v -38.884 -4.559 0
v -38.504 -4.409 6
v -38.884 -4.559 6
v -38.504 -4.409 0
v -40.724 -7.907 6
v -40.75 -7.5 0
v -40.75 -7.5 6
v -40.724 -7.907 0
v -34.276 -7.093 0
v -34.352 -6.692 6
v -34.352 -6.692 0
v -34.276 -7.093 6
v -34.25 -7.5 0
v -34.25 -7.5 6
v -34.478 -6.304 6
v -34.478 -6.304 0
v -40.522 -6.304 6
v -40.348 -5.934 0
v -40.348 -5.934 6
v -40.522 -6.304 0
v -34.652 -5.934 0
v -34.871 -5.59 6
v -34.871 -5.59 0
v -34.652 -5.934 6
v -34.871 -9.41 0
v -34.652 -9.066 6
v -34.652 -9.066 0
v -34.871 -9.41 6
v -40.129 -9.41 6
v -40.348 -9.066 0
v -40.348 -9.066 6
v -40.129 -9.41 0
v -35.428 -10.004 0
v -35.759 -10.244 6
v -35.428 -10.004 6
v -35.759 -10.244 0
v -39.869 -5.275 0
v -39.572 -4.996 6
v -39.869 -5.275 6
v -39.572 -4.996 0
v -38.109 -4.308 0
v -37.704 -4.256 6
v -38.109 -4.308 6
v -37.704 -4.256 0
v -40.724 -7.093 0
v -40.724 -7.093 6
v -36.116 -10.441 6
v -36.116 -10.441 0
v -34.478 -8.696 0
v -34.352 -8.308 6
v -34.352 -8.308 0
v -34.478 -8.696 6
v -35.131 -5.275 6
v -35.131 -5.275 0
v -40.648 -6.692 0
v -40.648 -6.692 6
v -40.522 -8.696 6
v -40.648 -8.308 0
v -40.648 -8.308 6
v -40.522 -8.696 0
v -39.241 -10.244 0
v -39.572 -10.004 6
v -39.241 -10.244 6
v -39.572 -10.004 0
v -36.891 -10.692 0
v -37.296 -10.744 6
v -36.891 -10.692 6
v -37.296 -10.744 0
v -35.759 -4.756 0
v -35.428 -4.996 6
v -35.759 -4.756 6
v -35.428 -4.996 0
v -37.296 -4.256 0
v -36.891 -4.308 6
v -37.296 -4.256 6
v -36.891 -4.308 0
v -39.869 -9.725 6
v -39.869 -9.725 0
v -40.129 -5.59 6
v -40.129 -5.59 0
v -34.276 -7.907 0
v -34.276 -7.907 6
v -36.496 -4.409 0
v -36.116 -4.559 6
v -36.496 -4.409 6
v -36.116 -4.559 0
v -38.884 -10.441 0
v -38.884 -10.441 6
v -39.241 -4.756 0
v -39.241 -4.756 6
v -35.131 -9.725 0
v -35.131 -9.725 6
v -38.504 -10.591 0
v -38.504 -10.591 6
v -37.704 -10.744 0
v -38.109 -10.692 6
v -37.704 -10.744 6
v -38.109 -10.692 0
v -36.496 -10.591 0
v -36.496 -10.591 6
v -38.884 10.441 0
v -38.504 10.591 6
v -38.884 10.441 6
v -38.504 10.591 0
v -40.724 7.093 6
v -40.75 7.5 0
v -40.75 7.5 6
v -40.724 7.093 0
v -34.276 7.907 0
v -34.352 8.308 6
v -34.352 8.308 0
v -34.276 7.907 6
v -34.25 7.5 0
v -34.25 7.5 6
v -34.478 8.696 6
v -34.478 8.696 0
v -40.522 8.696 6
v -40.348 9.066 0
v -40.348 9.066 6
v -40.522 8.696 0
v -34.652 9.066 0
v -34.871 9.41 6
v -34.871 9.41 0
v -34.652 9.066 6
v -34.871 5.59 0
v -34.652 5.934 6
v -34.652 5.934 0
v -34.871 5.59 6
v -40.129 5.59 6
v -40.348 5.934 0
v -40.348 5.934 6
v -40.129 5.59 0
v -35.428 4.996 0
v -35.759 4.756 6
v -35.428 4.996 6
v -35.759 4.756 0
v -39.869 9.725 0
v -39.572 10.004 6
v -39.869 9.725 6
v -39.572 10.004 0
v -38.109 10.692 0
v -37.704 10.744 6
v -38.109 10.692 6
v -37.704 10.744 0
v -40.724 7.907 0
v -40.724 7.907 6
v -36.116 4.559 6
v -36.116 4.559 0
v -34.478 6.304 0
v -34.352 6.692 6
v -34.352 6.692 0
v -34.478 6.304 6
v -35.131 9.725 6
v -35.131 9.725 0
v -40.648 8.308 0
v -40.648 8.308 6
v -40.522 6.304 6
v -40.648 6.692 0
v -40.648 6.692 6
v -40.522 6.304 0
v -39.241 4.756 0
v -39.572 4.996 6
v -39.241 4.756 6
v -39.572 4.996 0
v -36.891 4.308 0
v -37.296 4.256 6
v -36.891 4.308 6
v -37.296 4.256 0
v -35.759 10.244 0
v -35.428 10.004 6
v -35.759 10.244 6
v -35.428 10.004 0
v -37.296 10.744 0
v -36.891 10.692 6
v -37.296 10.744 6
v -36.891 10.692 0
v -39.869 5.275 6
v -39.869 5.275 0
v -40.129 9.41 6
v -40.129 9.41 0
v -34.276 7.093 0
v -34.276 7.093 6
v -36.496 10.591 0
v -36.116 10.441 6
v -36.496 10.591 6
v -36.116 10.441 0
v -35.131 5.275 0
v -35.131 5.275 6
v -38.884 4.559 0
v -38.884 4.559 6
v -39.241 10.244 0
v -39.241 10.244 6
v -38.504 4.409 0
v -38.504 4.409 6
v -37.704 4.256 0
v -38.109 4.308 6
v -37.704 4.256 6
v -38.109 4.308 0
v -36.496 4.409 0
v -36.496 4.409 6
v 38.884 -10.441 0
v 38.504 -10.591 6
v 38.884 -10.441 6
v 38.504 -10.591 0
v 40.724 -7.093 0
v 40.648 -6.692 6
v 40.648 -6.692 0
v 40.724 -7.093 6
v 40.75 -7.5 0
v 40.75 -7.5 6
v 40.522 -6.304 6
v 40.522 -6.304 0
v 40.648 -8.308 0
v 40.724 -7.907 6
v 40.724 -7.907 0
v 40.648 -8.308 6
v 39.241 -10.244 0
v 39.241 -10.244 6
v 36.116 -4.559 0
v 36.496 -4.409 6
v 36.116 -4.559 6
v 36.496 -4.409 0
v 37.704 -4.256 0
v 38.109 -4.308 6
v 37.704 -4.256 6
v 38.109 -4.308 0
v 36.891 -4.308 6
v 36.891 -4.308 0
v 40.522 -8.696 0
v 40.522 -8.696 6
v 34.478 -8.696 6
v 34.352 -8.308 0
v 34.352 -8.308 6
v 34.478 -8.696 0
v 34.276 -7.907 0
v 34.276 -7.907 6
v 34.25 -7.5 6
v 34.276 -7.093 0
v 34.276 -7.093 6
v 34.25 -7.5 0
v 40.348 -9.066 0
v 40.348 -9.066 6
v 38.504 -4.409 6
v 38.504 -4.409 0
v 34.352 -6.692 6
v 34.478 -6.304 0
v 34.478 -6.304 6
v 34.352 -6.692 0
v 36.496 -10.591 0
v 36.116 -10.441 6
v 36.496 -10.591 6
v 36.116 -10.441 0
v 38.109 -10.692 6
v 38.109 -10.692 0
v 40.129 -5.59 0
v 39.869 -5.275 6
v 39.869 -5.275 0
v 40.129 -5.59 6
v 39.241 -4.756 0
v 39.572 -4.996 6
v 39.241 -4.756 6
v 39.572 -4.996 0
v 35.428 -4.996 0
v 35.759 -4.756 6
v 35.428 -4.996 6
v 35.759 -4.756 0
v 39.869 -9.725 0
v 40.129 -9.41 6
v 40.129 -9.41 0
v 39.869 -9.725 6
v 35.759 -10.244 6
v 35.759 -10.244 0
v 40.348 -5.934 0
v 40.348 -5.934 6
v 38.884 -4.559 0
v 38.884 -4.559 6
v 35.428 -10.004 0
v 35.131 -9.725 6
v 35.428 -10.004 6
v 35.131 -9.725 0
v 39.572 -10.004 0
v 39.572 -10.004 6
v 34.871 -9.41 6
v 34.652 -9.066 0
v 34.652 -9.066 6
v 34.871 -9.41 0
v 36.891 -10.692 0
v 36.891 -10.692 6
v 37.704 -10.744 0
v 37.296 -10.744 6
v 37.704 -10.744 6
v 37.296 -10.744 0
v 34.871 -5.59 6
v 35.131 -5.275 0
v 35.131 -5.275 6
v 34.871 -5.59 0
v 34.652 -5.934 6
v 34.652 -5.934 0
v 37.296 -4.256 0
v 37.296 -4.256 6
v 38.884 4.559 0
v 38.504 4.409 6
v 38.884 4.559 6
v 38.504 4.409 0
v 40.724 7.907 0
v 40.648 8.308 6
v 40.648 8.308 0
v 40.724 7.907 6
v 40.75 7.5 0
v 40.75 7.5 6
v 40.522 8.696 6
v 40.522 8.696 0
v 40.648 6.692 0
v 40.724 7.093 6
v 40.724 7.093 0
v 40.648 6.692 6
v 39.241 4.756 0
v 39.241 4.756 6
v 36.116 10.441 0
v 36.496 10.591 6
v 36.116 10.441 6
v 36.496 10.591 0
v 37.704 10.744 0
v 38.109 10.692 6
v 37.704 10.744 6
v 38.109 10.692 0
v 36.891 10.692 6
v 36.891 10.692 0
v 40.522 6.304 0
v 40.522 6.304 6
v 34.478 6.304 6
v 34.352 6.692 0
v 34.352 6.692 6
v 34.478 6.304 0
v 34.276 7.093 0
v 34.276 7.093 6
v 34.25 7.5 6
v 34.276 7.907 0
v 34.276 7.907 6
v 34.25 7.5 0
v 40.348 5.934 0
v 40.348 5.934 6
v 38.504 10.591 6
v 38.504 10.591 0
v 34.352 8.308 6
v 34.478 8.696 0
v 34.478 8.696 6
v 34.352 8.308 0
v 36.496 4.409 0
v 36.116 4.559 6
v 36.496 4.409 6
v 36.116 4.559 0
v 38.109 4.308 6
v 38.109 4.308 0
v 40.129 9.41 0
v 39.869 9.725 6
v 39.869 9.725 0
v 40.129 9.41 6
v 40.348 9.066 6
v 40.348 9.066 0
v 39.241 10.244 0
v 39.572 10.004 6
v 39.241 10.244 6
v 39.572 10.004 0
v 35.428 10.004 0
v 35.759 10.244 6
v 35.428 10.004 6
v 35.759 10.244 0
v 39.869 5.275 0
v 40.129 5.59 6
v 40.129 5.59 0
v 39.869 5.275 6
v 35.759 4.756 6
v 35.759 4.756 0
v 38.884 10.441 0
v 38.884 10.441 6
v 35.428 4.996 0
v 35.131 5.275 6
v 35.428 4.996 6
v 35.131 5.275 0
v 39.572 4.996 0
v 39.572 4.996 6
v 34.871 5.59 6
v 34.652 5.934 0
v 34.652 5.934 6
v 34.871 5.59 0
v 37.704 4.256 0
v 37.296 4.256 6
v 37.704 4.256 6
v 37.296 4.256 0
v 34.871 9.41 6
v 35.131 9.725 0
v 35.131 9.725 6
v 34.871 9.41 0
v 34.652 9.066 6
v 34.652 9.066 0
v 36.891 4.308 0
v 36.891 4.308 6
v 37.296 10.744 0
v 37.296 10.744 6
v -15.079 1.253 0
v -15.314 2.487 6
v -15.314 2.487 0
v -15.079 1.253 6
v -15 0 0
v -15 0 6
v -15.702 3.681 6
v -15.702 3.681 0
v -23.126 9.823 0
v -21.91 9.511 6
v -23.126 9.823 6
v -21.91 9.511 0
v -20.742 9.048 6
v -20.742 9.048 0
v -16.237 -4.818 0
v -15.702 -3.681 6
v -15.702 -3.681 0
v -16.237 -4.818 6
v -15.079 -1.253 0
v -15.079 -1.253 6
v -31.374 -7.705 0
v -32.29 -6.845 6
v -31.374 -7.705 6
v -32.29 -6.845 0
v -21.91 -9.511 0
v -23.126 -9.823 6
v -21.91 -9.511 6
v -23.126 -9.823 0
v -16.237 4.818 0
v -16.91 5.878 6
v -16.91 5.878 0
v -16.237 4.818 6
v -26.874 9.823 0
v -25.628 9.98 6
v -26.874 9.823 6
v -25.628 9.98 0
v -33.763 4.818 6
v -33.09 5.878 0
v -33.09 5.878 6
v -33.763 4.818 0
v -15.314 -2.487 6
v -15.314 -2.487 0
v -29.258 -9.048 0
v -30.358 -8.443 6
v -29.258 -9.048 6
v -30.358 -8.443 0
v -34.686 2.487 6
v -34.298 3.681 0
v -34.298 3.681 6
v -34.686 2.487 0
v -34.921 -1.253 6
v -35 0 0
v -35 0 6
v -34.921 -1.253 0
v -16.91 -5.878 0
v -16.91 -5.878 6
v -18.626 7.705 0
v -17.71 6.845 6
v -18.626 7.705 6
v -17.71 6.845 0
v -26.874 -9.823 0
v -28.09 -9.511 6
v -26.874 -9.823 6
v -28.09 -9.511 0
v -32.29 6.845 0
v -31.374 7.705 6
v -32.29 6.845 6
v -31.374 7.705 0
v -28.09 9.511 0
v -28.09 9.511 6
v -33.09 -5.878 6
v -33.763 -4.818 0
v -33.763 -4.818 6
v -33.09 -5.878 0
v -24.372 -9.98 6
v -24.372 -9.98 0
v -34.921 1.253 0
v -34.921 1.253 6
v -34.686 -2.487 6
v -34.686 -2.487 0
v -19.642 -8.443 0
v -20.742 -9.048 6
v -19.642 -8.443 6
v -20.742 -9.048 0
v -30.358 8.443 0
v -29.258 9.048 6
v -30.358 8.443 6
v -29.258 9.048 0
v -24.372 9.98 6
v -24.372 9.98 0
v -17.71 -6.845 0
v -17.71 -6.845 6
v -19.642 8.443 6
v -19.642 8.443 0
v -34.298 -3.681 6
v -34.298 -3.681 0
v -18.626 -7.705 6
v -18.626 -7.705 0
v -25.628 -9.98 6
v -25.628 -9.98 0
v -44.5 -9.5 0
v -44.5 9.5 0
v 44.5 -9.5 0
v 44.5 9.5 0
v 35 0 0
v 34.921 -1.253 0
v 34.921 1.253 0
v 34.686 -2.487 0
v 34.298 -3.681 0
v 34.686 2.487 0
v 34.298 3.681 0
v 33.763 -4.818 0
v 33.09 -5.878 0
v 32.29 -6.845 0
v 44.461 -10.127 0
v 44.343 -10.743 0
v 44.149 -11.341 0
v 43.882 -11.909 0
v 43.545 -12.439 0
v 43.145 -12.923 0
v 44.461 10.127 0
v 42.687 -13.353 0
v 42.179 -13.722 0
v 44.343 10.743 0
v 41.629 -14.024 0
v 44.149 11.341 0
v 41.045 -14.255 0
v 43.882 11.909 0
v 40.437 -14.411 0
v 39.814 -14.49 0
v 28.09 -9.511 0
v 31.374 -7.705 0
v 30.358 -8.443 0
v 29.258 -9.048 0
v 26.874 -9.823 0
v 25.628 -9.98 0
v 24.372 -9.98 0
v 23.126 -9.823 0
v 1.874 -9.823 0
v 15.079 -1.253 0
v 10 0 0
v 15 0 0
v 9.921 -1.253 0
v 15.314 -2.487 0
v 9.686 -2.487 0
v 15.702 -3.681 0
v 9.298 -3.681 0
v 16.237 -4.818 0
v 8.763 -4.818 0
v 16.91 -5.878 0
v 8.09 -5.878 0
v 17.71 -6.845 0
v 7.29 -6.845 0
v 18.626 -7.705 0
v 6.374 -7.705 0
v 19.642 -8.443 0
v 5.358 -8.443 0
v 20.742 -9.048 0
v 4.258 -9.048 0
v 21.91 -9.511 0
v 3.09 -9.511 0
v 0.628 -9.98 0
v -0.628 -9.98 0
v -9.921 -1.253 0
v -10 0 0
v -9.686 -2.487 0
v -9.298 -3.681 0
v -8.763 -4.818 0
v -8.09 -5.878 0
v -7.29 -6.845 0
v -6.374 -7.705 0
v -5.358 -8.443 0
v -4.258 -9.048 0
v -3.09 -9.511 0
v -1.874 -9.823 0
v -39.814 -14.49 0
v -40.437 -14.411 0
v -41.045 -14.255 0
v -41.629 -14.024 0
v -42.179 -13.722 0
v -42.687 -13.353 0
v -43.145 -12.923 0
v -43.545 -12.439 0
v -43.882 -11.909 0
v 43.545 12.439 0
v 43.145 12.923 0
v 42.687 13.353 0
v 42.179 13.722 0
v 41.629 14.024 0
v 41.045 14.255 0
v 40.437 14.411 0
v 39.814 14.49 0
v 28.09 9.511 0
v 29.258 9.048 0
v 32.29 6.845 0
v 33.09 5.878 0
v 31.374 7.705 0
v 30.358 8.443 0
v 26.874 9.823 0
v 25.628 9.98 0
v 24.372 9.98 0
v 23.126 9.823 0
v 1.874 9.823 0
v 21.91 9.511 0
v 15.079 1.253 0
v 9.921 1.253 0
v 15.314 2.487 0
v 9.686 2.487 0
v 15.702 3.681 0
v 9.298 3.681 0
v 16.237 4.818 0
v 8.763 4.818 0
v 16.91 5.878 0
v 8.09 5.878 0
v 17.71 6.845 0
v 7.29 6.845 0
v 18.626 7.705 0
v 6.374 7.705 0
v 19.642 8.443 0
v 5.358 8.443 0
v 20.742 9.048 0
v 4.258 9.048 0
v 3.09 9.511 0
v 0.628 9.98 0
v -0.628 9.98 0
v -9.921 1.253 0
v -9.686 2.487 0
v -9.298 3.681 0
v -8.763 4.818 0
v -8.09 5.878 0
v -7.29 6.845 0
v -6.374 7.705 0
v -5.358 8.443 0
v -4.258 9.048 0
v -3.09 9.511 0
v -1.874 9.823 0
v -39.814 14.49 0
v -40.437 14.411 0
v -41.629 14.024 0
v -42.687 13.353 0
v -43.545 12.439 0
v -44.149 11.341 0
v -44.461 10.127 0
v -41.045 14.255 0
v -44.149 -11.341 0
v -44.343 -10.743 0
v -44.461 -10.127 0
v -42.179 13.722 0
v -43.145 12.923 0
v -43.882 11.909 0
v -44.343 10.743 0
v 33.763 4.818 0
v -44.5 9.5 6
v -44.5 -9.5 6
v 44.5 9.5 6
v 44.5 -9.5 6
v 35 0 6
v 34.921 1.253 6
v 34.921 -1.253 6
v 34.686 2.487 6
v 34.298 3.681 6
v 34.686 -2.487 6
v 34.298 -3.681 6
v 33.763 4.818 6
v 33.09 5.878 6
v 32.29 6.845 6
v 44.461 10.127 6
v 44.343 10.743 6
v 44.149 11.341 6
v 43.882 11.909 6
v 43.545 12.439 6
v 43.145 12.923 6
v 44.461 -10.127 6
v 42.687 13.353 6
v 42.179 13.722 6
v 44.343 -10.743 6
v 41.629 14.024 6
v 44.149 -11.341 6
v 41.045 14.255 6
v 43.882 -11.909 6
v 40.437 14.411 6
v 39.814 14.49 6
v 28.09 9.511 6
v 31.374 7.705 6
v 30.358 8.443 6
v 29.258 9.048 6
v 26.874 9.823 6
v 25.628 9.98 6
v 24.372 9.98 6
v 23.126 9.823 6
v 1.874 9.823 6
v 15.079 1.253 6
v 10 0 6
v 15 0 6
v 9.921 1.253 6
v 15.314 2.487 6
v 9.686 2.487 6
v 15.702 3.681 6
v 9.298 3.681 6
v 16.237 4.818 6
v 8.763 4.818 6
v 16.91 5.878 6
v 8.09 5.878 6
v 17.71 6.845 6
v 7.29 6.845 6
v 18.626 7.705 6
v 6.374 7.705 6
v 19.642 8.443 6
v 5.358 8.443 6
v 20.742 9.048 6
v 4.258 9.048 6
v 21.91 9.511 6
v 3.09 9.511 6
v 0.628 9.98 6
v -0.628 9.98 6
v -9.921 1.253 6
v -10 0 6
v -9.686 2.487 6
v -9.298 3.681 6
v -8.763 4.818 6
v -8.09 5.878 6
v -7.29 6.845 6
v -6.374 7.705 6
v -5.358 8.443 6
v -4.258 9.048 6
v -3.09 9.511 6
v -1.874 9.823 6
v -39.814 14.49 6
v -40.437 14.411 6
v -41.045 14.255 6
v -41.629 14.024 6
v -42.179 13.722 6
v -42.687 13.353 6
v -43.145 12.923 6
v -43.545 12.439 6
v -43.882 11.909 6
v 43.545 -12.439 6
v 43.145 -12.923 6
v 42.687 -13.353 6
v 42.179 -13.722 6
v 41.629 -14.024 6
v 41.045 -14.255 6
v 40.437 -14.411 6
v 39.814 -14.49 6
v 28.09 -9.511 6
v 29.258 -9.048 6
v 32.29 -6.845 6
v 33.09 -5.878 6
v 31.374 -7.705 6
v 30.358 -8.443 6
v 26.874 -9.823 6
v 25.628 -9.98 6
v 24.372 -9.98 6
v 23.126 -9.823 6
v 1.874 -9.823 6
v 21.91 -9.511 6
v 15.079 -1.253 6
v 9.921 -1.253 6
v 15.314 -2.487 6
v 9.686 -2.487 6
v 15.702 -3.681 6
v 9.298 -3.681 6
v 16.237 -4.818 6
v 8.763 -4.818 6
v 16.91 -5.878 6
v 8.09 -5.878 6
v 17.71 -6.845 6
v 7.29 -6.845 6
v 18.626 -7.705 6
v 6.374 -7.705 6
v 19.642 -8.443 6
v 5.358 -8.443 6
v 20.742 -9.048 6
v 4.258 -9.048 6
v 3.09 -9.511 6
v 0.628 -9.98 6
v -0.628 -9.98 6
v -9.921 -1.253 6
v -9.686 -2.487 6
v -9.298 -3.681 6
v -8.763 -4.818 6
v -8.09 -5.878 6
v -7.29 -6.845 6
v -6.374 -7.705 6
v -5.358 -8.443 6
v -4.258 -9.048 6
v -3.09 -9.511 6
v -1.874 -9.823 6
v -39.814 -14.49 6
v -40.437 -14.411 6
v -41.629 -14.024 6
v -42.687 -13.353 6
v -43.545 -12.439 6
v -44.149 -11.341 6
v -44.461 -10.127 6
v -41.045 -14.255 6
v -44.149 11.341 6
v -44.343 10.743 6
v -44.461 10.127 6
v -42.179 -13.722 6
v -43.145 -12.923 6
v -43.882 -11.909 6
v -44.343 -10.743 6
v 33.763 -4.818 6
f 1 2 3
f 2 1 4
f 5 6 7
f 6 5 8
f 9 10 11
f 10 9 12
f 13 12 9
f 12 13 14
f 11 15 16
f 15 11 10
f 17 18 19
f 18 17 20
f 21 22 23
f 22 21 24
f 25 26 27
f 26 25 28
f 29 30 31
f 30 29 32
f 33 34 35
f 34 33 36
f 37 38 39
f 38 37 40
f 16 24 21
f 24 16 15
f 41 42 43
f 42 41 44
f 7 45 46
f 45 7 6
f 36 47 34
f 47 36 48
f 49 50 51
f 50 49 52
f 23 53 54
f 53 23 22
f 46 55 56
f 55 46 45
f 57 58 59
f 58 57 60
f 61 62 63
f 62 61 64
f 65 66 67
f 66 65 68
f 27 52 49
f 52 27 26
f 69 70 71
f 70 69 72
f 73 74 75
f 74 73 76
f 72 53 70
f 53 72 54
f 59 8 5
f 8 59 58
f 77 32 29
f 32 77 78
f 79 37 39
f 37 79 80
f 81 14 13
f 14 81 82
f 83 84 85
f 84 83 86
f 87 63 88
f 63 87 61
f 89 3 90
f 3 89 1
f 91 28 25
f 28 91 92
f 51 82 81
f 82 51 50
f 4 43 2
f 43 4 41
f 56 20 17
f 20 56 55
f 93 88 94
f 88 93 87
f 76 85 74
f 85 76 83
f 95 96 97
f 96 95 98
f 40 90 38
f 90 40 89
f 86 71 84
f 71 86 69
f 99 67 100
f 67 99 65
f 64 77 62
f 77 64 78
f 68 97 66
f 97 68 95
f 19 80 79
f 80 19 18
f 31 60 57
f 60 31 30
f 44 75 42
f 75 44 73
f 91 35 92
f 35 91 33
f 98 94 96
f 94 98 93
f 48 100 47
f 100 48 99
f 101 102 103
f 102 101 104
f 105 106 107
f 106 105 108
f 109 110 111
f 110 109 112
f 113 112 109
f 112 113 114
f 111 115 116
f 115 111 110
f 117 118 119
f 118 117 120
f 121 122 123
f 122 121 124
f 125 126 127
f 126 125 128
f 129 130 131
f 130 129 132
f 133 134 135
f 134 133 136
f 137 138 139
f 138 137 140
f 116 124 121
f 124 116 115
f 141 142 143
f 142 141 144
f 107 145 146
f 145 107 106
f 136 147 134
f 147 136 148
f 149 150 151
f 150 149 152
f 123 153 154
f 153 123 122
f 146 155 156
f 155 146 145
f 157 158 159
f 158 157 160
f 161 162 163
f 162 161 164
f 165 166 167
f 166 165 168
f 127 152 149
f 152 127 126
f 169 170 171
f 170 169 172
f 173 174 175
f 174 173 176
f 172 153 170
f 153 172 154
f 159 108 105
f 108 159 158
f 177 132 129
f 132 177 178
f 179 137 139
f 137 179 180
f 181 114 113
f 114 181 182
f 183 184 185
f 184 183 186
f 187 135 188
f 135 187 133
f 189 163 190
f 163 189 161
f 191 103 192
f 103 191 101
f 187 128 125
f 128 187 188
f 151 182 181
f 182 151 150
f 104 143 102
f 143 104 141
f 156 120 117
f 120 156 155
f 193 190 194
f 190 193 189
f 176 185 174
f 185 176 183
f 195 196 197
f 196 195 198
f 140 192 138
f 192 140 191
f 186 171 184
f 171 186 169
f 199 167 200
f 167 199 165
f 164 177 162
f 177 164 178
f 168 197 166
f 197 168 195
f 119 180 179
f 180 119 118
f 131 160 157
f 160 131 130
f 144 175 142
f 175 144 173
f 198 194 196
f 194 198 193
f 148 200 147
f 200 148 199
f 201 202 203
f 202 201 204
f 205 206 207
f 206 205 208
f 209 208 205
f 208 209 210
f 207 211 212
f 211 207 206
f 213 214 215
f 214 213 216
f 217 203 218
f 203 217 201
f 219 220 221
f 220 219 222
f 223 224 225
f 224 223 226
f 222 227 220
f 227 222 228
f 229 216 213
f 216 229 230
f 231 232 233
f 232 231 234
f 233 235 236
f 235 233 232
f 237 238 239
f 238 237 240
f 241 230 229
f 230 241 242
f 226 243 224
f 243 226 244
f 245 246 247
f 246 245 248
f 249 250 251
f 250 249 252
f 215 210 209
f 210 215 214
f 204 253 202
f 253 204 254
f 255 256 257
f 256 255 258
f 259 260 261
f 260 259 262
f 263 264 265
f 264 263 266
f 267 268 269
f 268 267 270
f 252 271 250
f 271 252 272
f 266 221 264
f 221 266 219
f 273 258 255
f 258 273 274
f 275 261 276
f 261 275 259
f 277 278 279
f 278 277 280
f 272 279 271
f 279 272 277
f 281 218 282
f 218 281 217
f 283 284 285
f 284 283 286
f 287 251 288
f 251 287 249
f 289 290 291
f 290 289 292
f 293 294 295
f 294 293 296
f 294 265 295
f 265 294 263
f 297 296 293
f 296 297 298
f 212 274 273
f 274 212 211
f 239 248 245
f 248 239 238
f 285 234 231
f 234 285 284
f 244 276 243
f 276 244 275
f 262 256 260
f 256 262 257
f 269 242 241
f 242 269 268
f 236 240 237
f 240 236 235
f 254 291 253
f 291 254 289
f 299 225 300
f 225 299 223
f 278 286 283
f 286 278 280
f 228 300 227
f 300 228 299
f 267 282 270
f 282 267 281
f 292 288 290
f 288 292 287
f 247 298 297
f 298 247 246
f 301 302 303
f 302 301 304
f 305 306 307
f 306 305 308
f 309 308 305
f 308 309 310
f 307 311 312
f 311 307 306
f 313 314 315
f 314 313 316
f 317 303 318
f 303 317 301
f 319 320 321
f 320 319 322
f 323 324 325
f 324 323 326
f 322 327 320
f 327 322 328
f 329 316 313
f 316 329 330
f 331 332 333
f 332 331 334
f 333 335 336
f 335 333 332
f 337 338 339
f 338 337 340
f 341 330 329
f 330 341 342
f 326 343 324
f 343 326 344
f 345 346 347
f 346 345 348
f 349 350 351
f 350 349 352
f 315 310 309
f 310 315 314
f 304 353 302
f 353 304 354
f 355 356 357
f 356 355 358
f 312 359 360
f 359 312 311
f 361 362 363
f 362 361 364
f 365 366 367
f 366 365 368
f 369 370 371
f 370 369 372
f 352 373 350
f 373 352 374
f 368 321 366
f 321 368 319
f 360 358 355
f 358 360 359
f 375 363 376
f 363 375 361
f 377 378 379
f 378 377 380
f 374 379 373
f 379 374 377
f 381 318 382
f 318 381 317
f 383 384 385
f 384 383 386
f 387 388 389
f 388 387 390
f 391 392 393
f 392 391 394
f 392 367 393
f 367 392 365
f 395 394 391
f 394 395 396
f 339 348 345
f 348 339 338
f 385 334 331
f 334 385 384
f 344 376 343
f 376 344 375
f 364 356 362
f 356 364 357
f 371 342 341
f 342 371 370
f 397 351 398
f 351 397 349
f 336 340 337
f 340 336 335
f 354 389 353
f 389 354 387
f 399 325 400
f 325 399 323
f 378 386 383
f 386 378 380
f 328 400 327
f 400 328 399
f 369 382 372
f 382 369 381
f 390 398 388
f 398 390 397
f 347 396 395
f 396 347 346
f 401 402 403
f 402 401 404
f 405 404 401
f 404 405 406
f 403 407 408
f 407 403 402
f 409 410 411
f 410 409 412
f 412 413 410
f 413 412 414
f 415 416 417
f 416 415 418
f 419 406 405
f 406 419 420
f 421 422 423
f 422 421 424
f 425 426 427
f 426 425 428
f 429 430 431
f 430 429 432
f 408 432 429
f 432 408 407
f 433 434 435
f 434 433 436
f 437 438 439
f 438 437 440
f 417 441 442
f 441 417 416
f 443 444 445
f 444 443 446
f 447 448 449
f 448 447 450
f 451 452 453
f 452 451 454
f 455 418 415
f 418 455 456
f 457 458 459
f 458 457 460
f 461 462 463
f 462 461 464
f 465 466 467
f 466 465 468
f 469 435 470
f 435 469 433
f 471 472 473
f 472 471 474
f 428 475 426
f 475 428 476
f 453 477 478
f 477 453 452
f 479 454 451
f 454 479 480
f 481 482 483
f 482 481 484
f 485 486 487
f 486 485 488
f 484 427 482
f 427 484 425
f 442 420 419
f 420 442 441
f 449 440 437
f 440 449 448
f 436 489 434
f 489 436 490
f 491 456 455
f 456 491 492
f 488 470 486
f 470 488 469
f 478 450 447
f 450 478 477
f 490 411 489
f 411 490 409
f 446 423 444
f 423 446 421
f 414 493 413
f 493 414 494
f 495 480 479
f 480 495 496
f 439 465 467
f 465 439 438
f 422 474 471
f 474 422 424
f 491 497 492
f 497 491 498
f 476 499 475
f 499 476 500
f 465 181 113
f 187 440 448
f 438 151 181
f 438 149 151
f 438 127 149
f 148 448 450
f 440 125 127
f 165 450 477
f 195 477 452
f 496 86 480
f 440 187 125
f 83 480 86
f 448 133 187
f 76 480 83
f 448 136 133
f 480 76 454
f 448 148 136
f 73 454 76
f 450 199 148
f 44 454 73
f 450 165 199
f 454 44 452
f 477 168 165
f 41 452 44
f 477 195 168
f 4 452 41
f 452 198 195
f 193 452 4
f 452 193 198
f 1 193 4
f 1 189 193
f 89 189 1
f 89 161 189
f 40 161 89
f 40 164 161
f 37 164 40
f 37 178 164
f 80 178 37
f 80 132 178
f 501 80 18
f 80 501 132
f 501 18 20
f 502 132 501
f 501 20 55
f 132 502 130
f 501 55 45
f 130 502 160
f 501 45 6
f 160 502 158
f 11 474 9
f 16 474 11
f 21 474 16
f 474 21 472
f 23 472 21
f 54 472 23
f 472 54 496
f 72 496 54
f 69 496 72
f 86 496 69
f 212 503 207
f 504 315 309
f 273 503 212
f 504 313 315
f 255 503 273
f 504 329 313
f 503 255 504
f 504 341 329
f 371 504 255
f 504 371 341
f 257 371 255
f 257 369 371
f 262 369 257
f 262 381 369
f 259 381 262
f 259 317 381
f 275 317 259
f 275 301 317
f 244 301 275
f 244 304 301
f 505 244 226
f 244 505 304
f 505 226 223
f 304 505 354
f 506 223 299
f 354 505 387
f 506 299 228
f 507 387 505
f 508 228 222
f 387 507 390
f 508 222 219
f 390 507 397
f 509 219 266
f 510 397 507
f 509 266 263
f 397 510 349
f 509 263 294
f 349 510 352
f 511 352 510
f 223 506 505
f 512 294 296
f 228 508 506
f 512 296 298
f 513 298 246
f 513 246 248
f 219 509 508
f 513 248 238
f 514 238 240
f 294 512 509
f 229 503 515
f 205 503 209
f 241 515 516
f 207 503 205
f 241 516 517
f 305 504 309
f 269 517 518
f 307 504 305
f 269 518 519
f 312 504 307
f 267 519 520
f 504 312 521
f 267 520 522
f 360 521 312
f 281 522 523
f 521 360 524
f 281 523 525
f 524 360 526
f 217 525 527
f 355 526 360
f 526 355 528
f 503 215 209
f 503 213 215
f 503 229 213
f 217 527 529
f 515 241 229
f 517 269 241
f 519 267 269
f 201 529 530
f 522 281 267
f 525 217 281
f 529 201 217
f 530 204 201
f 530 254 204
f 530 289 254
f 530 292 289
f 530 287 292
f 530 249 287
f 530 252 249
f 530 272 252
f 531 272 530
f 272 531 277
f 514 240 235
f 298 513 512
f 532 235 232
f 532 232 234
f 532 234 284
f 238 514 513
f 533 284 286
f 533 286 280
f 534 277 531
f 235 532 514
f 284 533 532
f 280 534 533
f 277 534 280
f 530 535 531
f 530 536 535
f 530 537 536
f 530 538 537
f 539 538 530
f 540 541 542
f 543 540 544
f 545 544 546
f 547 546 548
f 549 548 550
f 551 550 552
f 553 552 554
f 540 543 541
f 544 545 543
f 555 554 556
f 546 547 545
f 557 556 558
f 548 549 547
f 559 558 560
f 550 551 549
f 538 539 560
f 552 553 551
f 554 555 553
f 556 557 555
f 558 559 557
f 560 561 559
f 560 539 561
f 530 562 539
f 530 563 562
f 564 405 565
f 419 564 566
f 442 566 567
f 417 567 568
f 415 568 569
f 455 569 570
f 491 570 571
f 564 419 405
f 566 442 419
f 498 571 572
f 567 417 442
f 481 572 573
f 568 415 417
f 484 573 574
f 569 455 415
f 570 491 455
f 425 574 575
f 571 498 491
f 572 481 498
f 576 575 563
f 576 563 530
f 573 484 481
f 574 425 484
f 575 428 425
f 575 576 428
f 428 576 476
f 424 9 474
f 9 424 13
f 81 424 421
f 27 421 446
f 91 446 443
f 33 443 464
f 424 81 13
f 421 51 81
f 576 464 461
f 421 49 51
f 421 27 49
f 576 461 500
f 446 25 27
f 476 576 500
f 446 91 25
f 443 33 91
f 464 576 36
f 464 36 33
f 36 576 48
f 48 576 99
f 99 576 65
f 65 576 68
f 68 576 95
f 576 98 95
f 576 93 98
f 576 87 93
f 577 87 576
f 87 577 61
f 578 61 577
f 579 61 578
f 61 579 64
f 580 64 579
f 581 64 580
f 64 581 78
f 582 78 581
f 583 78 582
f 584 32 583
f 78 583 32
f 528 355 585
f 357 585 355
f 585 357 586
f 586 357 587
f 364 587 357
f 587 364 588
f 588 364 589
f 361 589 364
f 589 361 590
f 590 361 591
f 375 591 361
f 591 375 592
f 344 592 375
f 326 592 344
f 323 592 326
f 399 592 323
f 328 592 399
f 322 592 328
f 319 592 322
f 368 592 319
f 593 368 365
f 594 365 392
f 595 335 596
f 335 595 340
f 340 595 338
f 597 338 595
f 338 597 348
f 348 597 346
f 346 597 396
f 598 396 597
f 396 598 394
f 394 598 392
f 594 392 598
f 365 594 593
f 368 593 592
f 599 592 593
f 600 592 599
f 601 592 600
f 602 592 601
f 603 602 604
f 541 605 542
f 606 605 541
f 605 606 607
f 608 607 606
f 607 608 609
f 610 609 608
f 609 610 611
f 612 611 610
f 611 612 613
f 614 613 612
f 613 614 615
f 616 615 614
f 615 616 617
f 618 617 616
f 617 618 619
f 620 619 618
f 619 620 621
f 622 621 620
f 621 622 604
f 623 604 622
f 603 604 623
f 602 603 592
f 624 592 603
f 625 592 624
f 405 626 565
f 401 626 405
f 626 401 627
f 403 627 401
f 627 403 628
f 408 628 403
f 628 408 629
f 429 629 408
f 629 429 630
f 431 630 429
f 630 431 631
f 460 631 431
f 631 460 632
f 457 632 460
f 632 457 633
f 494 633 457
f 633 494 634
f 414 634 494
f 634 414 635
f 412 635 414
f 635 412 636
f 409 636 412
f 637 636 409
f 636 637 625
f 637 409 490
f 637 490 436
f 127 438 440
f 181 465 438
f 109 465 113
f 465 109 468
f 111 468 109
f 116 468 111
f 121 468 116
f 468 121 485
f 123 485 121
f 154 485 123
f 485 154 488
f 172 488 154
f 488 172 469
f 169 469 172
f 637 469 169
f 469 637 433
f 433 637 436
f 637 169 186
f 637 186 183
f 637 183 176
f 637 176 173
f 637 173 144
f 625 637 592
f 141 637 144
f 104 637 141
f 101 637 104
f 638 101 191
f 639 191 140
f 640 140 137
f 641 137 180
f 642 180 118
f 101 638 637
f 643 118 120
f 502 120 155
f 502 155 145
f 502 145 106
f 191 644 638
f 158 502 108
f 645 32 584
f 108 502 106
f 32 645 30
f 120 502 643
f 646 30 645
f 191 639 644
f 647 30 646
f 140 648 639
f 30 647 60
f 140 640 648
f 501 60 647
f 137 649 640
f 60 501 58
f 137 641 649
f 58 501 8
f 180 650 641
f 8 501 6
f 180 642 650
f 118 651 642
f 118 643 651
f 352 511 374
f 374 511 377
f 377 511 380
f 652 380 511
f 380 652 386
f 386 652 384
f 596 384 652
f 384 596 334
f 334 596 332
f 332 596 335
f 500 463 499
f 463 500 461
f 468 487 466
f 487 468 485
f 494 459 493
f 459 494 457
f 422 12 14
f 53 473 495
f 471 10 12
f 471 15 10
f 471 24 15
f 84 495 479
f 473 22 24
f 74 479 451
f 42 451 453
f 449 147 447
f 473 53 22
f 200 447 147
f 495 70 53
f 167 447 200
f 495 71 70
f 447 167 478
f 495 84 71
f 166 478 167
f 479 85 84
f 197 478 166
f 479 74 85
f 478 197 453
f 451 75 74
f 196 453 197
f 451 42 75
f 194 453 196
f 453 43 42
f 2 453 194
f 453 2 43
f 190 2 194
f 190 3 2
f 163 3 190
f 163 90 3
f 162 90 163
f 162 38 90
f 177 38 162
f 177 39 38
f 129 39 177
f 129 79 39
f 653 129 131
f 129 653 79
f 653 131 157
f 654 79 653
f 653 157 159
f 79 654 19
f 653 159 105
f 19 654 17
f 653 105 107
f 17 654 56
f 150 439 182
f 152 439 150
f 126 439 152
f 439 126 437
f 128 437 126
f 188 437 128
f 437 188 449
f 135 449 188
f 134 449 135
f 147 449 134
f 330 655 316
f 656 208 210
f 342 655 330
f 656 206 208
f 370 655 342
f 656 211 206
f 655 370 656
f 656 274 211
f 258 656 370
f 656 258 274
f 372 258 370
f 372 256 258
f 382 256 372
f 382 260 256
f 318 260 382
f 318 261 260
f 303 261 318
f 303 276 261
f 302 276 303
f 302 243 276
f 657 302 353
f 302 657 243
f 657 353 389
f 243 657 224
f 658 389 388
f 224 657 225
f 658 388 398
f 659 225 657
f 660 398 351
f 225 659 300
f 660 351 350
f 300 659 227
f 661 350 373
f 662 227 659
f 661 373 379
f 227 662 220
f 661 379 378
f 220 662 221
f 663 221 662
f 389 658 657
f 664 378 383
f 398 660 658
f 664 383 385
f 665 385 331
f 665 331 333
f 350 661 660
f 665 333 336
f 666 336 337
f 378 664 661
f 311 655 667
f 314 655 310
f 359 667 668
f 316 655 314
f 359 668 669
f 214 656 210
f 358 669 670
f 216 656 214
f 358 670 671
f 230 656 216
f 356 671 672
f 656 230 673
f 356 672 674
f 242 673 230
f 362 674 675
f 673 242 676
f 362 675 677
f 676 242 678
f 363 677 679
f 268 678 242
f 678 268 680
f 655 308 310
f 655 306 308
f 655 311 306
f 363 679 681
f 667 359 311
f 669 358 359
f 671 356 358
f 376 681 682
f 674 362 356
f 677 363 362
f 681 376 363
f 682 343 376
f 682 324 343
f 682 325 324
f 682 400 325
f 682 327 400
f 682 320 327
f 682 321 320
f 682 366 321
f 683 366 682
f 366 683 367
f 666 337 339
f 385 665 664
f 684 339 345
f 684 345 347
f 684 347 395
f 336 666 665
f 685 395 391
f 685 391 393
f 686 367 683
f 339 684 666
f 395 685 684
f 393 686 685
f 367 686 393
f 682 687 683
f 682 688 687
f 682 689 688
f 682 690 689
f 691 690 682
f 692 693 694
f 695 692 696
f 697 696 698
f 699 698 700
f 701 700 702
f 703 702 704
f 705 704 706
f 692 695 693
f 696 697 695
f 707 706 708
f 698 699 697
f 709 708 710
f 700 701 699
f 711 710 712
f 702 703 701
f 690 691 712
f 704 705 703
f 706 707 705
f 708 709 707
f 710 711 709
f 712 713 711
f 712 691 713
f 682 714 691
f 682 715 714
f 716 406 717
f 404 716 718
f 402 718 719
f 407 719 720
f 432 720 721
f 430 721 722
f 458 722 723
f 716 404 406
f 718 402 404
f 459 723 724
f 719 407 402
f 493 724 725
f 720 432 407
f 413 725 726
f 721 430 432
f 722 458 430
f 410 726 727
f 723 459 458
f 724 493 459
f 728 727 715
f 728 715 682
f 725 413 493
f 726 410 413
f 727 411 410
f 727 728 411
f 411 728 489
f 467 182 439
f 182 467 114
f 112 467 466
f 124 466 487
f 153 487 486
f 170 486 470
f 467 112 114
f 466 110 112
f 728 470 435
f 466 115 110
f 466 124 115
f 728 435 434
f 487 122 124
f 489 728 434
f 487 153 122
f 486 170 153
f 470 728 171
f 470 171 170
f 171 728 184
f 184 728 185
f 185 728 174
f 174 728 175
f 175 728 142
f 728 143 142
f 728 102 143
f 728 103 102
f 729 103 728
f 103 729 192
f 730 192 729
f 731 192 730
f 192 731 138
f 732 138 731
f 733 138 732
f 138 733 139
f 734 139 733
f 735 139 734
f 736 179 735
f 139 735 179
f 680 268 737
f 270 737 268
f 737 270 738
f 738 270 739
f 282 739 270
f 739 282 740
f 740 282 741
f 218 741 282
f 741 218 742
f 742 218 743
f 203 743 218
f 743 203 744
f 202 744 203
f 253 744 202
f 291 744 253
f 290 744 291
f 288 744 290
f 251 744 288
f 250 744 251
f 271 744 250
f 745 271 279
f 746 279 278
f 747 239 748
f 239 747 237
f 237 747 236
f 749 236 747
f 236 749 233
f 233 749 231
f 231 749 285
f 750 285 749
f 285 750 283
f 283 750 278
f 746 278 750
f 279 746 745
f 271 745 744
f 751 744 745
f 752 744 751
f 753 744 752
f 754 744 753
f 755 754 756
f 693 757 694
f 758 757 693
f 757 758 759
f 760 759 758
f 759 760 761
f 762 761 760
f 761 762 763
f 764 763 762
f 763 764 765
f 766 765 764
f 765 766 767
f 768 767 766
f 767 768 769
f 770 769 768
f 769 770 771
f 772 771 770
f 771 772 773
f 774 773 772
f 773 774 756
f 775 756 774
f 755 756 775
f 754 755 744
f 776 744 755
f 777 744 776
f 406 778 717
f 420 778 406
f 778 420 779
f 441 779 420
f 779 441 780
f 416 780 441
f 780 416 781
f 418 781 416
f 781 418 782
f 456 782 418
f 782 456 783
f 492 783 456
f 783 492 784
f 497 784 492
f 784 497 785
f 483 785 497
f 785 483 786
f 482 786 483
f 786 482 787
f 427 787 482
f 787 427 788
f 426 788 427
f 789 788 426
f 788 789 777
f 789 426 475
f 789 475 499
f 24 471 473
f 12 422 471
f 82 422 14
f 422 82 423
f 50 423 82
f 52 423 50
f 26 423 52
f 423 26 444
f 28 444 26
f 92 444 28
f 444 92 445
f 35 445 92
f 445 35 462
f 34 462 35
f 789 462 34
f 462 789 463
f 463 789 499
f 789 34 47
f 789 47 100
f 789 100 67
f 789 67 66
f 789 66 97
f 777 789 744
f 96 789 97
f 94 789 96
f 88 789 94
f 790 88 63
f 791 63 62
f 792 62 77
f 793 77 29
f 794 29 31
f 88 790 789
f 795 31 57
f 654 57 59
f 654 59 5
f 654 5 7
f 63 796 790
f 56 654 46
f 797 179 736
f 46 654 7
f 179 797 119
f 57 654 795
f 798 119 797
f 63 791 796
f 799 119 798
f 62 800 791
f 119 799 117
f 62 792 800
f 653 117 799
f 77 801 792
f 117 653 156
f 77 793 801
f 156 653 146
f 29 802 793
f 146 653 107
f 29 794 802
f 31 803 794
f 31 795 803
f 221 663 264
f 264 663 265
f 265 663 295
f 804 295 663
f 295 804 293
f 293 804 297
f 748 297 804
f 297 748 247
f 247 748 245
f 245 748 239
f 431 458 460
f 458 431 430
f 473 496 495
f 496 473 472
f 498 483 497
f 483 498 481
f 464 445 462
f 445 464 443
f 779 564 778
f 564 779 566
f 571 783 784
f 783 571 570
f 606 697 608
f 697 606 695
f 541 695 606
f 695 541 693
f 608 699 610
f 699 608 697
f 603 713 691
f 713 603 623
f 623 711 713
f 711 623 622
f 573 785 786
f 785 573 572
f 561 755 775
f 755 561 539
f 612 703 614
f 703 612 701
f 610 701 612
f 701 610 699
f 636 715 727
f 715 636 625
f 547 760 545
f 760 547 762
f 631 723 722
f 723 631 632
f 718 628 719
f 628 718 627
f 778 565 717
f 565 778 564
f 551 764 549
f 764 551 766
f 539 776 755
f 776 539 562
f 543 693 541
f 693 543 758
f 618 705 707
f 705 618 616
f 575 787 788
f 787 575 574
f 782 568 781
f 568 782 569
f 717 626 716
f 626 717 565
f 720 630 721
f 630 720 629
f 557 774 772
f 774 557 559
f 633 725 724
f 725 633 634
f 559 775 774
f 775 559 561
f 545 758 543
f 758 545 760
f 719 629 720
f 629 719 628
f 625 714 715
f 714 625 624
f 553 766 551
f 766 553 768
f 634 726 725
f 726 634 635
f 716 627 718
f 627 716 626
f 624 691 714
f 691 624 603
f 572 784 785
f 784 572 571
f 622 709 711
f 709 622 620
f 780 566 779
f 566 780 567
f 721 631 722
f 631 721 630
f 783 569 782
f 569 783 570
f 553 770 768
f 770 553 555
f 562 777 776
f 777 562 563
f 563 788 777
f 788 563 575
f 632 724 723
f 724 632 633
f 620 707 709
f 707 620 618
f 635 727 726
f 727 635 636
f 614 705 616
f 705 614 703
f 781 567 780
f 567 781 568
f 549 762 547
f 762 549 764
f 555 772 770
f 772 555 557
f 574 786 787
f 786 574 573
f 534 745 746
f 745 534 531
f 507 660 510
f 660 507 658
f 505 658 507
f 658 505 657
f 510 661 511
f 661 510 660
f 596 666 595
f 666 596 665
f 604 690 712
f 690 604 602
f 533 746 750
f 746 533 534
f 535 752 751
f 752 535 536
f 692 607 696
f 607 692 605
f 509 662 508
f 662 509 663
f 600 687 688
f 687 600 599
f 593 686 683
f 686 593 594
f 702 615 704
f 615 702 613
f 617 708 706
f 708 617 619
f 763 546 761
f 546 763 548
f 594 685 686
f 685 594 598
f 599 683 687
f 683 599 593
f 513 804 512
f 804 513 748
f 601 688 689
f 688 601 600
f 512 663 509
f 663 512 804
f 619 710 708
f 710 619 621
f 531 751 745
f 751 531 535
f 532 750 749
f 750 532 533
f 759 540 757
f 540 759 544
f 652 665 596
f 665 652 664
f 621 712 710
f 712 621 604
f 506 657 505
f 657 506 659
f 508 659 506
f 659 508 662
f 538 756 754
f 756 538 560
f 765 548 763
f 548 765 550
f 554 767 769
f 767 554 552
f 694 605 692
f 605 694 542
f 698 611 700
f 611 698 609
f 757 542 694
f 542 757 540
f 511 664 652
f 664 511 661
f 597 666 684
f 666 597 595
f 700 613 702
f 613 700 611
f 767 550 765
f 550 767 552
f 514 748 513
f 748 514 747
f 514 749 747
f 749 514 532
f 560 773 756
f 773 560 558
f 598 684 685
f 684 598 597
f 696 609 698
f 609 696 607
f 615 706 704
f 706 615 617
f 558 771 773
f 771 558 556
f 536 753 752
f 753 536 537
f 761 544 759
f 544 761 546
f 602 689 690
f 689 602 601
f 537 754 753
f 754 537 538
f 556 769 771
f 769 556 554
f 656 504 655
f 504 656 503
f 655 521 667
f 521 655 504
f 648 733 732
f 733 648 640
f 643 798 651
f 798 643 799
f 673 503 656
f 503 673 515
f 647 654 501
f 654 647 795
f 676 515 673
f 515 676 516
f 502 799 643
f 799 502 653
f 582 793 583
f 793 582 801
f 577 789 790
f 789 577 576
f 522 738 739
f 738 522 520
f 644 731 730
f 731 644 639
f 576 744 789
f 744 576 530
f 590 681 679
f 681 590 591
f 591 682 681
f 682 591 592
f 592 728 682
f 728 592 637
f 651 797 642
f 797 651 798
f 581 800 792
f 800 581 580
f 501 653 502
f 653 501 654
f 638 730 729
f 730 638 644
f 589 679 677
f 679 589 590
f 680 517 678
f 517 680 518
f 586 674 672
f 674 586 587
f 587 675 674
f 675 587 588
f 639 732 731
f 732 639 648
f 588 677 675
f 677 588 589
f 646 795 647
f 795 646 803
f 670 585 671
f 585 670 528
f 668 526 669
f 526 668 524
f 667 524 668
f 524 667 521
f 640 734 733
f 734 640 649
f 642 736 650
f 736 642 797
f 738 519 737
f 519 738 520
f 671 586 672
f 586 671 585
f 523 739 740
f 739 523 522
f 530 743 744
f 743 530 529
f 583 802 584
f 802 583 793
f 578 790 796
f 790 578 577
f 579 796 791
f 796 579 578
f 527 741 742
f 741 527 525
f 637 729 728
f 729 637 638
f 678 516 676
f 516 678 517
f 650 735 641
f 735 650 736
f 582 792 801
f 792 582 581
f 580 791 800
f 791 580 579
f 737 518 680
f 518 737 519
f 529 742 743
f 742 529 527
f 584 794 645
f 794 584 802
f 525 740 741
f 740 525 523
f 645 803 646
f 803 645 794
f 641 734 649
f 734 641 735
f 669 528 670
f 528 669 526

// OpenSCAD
$fn = 50;


difference() {
	union() {
		hull() {
			translate(v = [-39.5000000000, 9.5000000000, 0]) {
				cylinder(h = 6, r = 5);
			}
			translate(v = [39.5000000000, 9.5000000000, 0]) {
				cylinder(h = 6, r = 5);
			}
			translate(v = [-39.5000000000, -9.5000000000, 0]) {
				cylinder(h = 6, r = 5);
			}
			translate(v = [39.5000000000, -9.5000000000, 0]) {
				cylinder(h = 6, r = 5);
			}
		}
	}
	union() {
		#translate(v = [-37.5000000000, -7.5000000000, -100.0000000000]) {
			cylinder(h = 200, r = 3.2500000000);
		}
		#translate(v = [-37.5000000000, 7.5000000000, -100.0000000000]) {
			cylinder(h = 200, r = 3.2500000000);
		}
		#translate(v = [37.5000000000, -7.5000000000, -100.0000000000]) {
			cylinder(h = 200, r = 3.2500000000);
		}
		#translate(v = [37.5000000000, 7.5000000000, -100.0000000000]) {
			cylinder(h = 200, r = 3.2500000000);
		}
		#translate(v = [-25.0000000000, 0, 0]) {
			cylinder(h = 6, r = 10.0000000000);
		}
		#cylinder(h = 6, r = 10.0000000000);
		#translate(v = [25.0000000000, 0, 0]) {
			cylinder(h = 6, r = 10.0000000000);
		}
	}
}
